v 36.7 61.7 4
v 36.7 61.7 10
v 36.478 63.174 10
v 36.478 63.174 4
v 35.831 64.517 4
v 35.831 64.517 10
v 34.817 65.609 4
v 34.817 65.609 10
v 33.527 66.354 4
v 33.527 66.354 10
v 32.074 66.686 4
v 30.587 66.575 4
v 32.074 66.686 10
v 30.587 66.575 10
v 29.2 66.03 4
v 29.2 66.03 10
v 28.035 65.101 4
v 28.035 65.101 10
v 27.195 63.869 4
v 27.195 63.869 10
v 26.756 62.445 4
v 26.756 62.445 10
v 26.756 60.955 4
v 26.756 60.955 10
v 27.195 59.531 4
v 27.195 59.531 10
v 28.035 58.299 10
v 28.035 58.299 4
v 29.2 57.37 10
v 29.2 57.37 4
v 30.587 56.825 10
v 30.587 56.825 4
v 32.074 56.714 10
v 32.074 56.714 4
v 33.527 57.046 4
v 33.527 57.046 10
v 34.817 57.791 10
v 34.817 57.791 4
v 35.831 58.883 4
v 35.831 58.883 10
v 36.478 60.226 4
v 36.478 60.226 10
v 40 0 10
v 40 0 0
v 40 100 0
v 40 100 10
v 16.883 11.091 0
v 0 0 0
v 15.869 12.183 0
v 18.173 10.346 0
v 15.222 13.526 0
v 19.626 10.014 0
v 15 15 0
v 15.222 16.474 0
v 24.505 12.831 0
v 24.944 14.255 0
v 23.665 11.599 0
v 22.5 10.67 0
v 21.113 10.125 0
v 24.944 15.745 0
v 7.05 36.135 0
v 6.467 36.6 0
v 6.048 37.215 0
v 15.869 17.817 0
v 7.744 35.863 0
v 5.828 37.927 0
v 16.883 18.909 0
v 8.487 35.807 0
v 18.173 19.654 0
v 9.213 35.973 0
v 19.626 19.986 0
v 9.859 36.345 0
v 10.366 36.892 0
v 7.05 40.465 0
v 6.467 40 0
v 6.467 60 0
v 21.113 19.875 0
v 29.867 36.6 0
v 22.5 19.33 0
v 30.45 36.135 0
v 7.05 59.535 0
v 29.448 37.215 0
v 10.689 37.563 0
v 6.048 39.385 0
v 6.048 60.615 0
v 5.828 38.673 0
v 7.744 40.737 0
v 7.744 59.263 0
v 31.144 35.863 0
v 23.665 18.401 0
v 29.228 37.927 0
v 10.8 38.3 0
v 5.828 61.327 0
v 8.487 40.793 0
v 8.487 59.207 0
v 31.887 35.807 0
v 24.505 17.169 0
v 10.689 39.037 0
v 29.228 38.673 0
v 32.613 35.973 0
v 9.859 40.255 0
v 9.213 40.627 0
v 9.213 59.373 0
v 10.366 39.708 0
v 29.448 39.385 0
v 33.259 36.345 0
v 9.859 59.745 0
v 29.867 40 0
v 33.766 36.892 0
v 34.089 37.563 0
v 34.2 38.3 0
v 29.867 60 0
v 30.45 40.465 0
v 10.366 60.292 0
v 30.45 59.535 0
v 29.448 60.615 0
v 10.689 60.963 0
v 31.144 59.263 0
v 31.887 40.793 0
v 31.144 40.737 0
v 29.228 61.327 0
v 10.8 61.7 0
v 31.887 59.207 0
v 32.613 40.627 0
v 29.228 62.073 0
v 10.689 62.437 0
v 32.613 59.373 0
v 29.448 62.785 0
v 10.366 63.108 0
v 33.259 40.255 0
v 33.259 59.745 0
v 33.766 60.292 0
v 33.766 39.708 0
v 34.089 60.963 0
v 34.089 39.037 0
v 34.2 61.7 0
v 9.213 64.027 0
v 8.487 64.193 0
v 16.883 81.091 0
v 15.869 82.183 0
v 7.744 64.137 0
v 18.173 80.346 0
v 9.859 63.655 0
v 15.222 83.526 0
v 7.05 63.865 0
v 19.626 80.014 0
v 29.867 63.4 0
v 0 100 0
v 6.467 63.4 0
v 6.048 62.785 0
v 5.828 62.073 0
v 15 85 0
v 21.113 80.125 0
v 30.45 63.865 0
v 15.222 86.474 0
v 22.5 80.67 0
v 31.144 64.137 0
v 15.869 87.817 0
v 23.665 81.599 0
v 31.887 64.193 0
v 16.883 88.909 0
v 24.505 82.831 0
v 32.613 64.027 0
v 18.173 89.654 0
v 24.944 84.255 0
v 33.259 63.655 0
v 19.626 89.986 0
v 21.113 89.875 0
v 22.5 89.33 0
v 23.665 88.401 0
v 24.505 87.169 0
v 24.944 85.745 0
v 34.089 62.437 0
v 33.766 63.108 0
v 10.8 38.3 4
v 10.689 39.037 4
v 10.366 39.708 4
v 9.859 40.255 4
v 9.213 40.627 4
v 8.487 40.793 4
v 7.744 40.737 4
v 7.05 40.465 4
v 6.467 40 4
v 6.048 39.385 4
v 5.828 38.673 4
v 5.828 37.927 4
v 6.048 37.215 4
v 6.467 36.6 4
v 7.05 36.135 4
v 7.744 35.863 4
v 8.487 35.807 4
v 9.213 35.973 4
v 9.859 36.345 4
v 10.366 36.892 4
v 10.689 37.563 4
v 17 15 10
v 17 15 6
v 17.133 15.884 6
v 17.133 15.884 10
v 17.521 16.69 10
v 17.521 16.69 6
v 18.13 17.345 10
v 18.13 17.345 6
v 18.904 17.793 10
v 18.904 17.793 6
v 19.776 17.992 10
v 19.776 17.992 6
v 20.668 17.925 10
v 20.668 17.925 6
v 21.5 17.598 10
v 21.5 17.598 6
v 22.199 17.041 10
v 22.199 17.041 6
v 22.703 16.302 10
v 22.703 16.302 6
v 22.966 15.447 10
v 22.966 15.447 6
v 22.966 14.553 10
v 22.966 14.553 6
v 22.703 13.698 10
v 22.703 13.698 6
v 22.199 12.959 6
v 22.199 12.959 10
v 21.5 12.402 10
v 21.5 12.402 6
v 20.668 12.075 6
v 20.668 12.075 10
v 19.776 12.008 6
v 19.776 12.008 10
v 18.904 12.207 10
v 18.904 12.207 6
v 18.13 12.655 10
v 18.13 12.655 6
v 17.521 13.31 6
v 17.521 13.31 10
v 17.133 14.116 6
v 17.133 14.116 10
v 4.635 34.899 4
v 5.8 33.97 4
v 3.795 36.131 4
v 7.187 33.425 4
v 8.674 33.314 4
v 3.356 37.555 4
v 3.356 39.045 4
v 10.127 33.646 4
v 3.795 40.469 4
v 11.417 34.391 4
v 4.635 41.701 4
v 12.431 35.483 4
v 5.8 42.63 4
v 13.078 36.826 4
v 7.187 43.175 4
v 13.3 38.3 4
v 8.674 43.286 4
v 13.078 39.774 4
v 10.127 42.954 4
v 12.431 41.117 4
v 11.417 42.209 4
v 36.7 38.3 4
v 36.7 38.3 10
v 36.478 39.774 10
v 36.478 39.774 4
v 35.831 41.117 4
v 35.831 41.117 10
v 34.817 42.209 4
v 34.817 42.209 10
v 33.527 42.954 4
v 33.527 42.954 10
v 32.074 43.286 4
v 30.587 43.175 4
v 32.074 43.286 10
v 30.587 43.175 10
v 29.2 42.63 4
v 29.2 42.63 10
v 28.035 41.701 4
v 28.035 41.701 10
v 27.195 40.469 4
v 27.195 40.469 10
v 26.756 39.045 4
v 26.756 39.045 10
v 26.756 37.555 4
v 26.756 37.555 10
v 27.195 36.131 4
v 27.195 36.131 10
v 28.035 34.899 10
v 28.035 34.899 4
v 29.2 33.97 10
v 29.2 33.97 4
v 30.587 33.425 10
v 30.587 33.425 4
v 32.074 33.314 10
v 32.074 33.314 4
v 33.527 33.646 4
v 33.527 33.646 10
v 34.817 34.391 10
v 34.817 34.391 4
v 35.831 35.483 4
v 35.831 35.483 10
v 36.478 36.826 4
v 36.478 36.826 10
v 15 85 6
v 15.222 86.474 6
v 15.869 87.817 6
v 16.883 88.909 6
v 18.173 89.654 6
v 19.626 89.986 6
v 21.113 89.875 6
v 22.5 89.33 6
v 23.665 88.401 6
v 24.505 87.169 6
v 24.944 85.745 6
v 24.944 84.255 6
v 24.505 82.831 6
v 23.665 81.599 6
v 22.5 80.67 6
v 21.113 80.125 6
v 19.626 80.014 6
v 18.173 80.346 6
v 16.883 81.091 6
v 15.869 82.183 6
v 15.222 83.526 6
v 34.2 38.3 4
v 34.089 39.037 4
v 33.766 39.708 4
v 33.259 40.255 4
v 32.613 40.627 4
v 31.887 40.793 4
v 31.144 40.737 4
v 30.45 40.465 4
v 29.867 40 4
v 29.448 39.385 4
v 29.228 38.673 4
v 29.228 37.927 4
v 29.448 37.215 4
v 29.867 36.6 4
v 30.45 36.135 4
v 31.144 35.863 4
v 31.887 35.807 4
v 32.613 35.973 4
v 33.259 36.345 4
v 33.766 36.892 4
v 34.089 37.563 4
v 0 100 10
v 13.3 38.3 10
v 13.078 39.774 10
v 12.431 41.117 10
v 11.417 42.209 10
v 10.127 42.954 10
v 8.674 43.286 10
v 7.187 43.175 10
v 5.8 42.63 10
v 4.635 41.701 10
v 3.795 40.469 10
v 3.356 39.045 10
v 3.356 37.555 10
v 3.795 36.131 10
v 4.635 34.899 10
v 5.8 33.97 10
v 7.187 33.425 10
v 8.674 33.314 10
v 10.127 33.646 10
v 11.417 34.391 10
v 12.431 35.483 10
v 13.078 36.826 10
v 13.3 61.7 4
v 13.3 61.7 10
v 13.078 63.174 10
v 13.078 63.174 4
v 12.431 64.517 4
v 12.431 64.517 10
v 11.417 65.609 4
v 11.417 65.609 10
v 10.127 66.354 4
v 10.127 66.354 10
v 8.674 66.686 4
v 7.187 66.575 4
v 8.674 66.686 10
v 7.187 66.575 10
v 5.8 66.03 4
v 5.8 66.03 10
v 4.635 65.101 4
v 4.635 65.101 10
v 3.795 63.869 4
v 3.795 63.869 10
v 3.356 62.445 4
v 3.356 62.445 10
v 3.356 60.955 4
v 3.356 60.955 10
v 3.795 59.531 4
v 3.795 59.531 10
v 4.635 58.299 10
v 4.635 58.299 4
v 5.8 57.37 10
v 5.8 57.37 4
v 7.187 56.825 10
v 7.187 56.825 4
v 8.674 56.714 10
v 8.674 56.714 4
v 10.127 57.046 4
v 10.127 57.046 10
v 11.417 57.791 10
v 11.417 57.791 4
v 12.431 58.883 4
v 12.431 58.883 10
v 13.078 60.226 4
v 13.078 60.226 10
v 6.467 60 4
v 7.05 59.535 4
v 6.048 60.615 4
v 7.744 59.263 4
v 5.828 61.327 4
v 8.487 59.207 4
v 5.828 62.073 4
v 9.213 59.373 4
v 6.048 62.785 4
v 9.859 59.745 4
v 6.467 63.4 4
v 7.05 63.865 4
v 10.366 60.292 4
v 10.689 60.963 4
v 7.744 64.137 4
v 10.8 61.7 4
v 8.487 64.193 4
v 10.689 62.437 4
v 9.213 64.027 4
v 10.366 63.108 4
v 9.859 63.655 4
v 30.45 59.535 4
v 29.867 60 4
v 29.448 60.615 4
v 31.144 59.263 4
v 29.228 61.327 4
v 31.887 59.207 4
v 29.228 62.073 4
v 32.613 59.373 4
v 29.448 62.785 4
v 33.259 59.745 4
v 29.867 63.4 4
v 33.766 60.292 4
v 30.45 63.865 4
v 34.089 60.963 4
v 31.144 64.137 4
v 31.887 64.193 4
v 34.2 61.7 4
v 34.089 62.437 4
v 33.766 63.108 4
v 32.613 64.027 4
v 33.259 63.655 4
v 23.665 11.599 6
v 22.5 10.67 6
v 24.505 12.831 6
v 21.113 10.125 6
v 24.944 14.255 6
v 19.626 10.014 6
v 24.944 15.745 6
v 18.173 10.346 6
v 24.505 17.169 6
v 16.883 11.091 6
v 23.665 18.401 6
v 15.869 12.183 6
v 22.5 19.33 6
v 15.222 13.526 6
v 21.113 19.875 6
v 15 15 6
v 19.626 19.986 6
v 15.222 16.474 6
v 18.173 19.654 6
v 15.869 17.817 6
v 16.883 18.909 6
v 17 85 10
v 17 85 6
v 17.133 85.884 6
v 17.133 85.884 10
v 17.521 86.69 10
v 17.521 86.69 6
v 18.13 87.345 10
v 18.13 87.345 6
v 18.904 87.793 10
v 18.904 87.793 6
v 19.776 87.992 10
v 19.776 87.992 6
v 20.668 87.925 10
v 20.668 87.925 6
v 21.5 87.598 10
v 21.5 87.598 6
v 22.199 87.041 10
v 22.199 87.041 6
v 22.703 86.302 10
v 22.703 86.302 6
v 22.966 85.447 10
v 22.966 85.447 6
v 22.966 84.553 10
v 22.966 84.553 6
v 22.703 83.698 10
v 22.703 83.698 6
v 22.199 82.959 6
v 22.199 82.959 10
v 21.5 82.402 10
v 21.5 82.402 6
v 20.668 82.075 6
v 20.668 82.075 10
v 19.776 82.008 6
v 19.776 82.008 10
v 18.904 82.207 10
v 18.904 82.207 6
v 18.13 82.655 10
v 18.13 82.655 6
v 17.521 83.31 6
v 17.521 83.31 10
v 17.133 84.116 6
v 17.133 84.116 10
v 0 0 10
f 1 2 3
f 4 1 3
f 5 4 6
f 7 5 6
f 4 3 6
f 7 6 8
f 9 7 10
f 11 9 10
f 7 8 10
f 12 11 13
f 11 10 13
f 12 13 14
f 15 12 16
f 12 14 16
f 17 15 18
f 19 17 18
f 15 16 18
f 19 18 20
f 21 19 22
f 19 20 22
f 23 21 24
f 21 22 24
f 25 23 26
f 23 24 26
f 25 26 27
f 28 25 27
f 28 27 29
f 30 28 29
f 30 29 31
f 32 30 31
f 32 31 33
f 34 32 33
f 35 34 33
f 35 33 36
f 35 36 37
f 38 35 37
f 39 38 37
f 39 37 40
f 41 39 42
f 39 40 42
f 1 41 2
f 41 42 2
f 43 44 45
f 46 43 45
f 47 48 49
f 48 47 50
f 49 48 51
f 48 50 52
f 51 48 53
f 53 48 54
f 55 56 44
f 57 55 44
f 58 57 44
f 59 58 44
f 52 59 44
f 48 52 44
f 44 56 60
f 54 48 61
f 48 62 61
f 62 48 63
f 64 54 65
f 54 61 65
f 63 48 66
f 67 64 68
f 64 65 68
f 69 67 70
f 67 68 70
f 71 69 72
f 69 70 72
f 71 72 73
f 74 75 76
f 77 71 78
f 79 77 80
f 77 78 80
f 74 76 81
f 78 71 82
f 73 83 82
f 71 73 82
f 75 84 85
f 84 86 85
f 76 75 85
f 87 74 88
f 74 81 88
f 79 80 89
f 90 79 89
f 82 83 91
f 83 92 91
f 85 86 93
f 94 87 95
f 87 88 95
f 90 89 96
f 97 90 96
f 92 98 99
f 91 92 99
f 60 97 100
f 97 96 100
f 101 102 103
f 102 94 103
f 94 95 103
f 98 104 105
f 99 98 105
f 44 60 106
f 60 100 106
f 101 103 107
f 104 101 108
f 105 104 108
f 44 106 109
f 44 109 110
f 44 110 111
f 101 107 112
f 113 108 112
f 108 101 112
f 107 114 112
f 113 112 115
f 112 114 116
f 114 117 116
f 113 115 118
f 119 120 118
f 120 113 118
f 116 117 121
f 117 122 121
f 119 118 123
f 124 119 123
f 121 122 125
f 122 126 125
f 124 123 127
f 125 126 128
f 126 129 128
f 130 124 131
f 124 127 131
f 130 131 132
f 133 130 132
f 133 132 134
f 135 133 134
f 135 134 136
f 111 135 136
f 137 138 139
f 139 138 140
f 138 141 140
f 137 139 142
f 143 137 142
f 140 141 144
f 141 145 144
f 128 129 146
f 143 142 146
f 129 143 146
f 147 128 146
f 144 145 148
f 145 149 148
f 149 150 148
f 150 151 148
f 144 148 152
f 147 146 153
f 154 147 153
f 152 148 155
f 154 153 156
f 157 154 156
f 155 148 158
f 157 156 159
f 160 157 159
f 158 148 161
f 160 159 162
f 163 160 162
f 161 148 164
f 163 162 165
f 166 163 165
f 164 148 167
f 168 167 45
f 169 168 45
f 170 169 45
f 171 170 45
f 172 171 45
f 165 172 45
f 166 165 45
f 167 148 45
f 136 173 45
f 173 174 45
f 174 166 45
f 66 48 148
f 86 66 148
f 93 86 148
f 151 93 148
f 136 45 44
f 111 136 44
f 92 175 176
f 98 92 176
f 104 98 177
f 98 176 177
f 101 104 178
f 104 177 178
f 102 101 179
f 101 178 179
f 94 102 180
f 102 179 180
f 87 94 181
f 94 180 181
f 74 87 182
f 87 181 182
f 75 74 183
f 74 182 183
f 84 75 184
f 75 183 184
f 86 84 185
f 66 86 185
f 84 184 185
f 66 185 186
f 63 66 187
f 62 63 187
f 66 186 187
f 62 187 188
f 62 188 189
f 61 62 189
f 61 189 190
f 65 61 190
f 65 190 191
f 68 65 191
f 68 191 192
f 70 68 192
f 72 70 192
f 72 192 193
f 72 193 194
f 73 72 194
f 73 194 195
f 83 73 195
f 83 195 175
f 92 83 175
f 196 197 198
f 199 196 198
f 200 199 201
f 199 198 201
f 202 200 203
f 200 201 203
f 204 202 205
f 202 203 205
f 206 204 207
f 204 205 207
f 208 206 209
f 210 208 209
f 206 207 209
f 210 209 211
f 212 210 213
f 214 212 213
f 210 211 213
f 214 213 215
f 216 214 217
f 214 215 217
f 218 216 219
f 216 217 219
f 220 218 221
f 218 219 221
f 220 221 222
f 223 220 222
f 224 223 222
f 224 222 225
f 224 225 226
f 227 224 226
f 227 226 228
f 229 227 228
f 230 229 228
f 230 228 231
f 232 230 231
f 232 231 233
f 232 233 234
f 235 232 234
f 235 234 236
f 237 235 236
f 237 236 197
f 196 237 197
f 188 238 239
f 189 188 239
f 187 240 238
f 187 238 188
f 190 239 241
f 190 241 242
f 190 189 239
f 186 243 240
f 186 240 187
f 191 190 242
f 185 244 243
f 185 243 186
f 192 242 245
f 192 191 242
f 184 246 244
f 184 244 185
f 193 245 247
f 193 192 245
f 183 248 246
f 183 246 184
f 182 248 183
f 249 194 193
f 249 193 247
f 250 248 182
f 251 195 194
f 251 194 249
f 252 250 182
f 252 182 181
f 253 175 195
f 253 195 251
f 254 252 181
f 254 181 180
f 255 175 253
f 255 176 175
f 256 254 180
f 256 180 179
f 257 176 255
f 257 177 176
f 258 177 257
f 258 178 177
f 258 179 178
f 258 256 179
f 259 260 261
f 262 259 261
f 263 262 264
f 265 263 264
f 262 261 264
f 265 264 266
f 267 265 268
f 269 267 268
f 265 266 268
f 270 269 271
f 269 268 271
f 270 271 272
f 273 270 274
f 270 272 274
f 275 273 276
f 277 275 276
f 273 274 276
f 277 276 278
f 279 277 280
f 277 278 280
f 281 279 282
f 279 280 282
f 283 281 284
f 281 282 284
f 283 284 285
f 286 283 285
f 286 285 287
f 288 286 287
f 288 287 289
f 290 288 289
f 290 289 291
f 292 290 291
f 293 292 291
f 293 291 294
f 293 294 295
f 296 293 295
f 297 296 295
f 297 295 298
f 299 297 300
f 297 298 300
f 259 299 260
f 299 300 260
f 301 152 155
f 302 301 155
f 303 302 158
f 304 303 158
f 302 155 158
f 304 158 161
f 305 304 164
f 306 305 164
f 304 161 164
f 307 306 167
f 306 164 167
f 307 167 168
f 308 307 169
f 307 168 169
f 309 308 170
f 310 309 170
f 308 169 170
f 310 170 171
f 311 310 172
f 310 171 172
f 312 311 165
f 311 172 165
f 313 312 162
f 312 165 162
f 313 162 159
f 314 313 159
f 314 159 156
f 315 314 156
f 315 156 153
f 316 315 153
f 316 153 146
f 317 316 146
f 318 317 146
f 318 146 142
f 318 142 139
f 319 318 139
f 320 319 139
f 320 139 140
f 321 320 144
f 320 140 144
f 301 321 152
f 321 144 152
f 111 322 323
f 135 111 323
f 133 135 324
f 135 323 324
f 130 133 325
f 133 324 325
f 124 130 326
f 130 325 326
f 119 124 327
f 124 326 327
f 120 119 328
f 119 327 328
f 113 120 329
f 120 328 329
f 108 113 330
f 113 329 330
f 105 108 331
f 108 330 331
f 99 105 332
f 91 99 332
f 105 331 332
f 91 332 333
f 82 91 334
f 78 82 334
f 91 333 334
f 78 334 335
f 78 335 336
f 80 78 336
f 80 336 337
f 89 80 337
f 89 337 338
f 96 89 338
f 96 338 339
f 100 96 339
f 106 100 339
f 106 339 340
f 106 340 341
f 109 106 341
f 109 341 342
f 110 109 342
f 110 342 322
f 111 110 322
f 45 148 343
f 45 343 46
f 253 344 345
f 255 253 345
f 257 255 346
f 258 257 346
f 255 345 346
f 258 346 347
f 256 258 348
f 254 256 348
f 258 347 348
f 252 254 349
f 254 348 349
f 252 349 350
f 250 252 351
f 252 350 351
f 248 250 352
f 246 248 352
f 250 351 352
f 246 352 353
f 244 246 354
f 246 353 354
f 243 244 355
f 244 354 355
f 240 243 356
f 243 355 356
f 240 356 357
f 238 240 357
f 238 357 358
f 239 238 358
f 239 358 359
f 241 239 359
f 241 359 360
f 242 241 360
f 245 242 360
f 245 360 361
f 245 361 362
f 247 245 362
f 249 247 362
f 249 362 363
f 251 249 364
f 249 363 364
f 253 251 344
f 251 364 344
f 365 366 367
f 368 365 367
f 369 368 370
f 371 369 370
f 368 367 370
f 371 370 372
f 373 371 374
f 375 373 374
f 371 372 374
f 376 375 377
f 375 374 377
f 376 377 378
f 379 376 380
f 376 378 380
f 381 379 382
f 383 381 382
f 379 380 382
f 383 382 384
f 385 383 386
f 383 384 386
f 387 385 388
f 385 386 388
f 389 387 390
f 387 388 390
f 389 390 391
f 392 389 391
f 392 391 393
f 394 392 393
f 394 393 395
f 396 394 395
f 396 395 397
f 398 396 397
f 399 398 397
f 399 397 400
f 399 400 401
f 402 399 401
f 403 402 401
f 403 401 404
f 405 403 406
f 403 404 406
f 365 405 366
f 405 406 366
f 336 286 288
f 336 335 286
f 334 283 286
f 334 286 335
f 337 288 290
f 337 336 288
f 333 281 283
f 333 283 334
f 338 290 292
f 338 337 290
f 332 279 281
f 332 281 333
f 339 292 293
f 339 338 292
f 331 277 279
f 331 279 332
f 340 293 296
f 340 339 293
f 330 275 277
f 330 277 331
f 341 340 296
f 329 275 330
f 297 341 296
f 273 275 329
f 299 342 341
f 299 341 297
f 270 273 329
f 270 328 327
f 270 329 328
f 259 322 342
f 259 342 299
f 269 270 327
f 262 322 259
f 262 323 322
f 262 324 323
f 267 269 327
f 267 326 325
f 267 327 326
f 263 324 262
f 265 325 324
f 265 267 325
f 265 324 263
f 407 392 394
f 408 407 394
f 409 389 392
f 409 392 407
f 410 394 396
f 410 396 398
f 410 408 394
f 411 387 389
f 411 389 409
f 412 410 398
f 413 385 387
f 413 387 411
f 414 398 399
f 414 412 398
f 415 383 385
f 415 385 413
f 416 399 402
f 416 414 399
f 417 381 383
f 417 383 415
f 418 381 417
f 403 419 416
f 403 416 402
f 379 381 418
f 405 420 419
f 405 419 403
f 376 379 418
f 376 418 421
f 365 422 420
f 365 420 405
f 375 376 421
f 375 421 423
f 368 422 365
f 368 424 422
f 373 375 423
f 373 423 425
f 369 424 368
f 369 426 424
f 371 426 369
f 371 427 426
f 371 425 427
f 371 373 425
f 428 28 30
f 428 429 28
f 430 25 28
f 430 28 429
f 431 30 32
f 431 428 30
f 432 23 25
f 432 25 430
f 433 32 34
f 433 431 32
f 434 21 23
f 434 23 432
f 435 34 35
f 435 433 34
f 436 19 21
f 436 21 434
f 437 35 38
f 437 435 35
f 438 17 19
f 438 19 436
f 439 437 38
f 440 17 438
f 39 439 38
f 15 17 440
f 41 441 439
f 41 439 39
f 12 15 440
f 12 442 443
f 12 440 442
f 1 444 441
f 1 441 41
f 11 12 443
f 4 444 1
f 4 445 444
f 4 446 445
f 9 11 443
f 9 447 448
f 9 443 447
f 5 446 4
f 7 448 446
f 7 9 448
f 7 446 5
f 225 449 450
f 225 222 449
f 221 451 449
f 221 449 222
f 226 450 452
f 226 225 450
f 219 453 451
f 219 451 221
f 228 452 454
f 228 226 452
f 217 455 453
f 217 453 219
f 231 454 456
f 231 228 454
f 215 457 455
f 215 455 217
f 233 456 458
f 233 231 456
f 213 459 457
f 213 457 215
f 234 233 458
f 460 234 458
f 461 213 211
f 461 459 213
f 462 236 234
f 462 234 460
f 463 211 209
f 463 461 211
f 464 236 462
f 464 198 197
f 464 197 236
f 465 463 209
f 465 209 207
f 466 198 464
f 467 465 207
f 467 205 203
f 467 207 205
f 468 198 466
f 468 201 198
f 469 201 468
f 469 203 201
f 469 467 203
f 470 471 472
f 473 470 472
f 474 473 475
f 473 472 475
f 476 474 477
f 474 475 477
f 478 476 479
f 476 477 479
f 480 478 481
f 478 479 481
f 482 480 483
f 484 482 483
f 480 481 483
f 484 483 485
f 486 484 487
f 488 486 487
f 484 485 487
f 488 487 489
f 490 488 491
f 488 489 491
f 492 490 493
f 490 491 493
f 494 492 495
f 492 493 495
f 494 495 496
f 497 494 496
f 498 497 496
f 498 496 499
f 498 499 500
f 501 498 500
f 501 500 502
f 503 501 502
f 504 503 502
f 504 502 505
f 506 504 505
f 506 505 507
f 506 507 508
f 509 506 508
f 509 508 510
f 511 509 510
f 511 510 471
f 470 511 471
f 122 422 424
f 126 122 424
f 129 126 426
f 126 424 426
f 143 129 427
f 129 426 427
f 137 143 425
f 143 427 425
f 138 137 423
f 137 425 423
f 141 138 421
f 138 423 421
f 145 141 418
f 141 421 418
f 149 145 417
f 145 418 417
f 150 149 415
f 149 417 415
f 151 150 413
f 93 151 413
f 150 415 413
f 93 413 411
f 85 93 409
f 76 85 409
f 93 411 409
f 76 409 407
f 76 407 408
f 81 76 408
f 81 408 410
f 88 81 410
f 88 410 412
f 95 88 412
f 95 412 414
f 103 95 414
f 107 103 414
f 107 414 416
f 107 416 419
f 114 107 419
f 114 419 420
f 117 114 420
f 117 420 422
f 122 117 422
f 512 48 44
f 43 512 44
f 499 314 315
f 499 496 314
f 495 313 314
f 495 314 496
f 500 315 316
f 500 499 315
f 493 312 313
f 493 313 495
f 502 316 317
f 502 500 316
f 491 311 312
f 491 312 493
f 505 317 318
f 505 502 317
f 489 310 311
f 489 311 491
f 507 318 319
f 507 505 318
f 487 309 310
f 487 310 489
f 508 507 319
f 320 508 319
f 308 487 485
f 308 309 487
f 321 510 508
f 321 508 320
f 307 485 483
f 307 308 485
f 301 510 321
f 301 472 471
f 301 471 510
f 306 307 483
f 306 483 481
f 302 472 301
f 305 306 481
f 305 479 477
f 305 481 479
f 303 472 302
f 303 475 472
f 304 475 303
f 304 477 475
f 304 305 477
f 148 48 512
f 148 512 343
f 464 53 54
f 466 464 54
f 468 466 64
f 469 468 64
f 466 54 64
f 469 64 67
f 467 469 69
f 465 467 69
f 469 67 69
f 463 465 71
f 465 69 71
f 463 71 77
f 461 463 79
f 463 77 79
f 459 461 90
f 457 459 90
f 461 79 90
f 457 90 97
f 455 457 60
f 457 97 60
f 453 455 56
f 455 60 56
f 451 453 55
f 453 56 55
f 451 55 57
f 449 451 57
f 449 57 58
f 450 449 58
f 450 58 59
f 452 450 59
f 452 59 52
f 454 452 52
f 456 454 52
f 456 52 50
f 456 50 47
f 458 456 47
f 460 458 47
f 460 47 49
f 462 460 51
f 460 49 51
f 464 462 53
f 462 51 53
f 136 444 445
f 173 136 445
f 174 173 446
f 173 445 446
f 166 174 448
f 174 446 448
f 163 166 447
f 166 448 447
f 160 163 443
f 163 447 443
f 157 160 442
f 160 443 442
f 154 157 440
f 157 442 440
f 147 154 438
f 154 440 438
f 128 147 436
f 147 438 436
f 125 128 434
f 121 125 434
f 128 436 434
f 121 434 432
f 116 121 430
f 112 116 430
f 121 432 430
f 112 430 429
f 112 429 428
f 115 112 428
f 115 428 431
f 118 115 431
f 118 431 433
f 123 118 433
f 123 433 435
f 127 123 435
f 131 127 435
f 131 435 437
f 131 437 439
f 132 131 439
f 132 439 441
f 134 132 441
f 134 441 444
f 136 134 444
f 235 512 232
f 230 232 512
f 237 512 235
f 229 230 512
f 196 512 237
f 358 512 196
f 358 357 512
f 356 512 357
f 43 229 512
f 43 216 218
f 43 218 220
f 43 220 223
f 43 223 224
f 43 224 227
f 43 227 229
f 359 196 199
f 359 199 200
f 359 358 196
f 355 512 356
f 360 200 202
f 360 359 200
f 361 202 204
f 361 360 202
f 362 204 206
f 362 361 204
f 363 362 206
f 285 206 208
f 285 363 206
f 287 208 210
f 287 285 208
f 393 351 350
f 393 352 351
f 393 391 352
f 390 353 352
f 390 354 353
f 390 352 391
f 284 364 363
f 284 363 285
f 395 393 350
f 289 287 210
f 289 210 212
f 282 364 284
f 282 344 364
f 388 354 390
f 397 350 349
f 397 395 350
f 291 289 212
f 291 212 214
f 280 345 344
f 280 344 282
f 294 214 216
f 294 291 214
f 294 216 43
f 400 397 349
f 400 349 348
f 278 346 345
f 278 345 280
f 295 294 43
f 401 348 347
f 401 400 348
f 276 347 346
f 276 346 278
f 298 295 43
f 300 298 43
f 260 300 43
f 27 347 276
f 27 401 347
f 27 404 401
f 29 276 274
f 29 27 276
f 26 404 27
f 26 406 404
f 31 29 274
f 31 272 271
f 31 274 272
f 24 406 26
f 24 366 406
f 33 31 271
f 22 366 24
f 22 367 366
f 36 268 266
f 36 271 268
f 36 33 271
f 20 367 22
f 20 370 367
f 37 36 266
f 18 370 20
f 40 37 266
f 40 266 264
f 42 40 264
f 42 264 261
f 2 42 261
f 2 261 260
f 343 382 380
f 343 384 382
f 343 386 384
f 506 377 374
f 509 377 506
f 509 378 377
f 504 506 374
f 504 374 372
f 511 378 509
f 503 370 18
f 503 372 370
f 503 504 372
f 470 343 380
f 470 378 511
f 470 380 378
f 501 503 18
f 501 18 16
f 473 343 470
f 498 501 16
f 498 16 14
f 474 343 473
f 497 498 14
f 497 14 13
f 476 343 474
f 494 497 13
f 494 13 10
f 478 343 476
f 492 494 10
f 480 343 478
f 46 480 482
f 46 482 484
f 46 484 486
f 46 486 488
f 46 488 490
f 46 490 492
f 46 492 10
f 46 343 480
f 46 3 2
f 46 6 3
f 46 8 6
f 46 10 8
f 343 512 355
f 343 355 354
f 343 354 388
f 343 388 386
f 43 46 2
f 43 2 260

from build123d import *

# Parameters (mm, degrees)
SKETCH1_W           = 40
SKETCH1_H           = 100
BOSS_EXTRUDE1_DEPTH = 10
SKETCH3_R           = 2.5
CUT_EXTRUDE1_DEPTH  = 40
SKETCH4_R           = 5
CUT_EXTRUDE2_DEPTH  = 6
SKETCH6_R           = 5
CUT_EXTRUDE3_DEPTH  = 6
SKETCH7_R           = 3
CUT_EXTRUDE4_DEPTH  = 5


with BuildPart() as part:
    # Sketch1 → Boss-Extrude1 (new body)
    with BuildSketch(Plane.XY):
        with Locations((20, 50)):
            Rectangle(SKETCH1_W, SKETCH1_H)
    extrude(amount=BOSS_EXTRUDE1_DEPTH)

    # Sketch3 → Cut-Extrude1 (cut)
    with BuildSketch(Plane.XY.offset(10)):
        with Locations((8.3, 61.7)):
            Circle(SKETCH3_R)
        with Locations((31.7, 61.7)):
            Circle(SKETCH3_R)
        with Locations((31.7, 38.3)):
            Circle(SKETCH3_R)
        with Locations((8.3, 38.3)):
            Circle(SKETCH3_R)
    extrude(amount=-CUT_EXTRUDE1_DEPTH, mode=Mode.SUBTRACT)

    # Sketch4 → Cut-Extrude2 (cut)
    with BuildSketch(Plane.XY.offset(10)):
        with Locations((8.3, 61.7)):
            Circle(SKETCH4_R)
        with Locations((31.7, 61.7)):
            Circle(SKETCH4_R)
        with Locations((31.7, 38.3)):
            Circle(SKETCH4_R)
        with Locations((8.3, 38.3)):
            Circle(SKETCH4_R)
    extrude(amount=-CUT_EXTRUDE2_DEPTH, mode=Mode.SUBTRACT)

    # Sketch6 → Cut-Extrude3 (cut)
    with BuildSketch(Plane(origin=(0, 0, 0), x_dir=(-1, 0, 0), z_dir=(0, 0, -1))):
        with Locations((-20, 85)):
            Circle(SKETCH6_R)
        with Locations((-20, 15)):
            Circle(SKETCH6_R)
    extrude(amount=-CUT_EXTRUDE3_DEPTH, mode=Mode.SUBTRACT)

    # Sketch7 → Cut-Extrude4 (cut, through all)
    with BuildSketch(Plane(origin=(0, 0, 6), x_dir=(-1, 0, 0), z_dir=(0, 0, -1))):
        with Locations((-20, 15)):
            Circle(SKETCH7_R)
        with Locations((-20, 85)):
            Circle(SKETCH7_R)
    extrude(amount=-CUT_EXTRUDE4_DEPTH, mode=Mode.SUBTRACT)


solid = part.part
